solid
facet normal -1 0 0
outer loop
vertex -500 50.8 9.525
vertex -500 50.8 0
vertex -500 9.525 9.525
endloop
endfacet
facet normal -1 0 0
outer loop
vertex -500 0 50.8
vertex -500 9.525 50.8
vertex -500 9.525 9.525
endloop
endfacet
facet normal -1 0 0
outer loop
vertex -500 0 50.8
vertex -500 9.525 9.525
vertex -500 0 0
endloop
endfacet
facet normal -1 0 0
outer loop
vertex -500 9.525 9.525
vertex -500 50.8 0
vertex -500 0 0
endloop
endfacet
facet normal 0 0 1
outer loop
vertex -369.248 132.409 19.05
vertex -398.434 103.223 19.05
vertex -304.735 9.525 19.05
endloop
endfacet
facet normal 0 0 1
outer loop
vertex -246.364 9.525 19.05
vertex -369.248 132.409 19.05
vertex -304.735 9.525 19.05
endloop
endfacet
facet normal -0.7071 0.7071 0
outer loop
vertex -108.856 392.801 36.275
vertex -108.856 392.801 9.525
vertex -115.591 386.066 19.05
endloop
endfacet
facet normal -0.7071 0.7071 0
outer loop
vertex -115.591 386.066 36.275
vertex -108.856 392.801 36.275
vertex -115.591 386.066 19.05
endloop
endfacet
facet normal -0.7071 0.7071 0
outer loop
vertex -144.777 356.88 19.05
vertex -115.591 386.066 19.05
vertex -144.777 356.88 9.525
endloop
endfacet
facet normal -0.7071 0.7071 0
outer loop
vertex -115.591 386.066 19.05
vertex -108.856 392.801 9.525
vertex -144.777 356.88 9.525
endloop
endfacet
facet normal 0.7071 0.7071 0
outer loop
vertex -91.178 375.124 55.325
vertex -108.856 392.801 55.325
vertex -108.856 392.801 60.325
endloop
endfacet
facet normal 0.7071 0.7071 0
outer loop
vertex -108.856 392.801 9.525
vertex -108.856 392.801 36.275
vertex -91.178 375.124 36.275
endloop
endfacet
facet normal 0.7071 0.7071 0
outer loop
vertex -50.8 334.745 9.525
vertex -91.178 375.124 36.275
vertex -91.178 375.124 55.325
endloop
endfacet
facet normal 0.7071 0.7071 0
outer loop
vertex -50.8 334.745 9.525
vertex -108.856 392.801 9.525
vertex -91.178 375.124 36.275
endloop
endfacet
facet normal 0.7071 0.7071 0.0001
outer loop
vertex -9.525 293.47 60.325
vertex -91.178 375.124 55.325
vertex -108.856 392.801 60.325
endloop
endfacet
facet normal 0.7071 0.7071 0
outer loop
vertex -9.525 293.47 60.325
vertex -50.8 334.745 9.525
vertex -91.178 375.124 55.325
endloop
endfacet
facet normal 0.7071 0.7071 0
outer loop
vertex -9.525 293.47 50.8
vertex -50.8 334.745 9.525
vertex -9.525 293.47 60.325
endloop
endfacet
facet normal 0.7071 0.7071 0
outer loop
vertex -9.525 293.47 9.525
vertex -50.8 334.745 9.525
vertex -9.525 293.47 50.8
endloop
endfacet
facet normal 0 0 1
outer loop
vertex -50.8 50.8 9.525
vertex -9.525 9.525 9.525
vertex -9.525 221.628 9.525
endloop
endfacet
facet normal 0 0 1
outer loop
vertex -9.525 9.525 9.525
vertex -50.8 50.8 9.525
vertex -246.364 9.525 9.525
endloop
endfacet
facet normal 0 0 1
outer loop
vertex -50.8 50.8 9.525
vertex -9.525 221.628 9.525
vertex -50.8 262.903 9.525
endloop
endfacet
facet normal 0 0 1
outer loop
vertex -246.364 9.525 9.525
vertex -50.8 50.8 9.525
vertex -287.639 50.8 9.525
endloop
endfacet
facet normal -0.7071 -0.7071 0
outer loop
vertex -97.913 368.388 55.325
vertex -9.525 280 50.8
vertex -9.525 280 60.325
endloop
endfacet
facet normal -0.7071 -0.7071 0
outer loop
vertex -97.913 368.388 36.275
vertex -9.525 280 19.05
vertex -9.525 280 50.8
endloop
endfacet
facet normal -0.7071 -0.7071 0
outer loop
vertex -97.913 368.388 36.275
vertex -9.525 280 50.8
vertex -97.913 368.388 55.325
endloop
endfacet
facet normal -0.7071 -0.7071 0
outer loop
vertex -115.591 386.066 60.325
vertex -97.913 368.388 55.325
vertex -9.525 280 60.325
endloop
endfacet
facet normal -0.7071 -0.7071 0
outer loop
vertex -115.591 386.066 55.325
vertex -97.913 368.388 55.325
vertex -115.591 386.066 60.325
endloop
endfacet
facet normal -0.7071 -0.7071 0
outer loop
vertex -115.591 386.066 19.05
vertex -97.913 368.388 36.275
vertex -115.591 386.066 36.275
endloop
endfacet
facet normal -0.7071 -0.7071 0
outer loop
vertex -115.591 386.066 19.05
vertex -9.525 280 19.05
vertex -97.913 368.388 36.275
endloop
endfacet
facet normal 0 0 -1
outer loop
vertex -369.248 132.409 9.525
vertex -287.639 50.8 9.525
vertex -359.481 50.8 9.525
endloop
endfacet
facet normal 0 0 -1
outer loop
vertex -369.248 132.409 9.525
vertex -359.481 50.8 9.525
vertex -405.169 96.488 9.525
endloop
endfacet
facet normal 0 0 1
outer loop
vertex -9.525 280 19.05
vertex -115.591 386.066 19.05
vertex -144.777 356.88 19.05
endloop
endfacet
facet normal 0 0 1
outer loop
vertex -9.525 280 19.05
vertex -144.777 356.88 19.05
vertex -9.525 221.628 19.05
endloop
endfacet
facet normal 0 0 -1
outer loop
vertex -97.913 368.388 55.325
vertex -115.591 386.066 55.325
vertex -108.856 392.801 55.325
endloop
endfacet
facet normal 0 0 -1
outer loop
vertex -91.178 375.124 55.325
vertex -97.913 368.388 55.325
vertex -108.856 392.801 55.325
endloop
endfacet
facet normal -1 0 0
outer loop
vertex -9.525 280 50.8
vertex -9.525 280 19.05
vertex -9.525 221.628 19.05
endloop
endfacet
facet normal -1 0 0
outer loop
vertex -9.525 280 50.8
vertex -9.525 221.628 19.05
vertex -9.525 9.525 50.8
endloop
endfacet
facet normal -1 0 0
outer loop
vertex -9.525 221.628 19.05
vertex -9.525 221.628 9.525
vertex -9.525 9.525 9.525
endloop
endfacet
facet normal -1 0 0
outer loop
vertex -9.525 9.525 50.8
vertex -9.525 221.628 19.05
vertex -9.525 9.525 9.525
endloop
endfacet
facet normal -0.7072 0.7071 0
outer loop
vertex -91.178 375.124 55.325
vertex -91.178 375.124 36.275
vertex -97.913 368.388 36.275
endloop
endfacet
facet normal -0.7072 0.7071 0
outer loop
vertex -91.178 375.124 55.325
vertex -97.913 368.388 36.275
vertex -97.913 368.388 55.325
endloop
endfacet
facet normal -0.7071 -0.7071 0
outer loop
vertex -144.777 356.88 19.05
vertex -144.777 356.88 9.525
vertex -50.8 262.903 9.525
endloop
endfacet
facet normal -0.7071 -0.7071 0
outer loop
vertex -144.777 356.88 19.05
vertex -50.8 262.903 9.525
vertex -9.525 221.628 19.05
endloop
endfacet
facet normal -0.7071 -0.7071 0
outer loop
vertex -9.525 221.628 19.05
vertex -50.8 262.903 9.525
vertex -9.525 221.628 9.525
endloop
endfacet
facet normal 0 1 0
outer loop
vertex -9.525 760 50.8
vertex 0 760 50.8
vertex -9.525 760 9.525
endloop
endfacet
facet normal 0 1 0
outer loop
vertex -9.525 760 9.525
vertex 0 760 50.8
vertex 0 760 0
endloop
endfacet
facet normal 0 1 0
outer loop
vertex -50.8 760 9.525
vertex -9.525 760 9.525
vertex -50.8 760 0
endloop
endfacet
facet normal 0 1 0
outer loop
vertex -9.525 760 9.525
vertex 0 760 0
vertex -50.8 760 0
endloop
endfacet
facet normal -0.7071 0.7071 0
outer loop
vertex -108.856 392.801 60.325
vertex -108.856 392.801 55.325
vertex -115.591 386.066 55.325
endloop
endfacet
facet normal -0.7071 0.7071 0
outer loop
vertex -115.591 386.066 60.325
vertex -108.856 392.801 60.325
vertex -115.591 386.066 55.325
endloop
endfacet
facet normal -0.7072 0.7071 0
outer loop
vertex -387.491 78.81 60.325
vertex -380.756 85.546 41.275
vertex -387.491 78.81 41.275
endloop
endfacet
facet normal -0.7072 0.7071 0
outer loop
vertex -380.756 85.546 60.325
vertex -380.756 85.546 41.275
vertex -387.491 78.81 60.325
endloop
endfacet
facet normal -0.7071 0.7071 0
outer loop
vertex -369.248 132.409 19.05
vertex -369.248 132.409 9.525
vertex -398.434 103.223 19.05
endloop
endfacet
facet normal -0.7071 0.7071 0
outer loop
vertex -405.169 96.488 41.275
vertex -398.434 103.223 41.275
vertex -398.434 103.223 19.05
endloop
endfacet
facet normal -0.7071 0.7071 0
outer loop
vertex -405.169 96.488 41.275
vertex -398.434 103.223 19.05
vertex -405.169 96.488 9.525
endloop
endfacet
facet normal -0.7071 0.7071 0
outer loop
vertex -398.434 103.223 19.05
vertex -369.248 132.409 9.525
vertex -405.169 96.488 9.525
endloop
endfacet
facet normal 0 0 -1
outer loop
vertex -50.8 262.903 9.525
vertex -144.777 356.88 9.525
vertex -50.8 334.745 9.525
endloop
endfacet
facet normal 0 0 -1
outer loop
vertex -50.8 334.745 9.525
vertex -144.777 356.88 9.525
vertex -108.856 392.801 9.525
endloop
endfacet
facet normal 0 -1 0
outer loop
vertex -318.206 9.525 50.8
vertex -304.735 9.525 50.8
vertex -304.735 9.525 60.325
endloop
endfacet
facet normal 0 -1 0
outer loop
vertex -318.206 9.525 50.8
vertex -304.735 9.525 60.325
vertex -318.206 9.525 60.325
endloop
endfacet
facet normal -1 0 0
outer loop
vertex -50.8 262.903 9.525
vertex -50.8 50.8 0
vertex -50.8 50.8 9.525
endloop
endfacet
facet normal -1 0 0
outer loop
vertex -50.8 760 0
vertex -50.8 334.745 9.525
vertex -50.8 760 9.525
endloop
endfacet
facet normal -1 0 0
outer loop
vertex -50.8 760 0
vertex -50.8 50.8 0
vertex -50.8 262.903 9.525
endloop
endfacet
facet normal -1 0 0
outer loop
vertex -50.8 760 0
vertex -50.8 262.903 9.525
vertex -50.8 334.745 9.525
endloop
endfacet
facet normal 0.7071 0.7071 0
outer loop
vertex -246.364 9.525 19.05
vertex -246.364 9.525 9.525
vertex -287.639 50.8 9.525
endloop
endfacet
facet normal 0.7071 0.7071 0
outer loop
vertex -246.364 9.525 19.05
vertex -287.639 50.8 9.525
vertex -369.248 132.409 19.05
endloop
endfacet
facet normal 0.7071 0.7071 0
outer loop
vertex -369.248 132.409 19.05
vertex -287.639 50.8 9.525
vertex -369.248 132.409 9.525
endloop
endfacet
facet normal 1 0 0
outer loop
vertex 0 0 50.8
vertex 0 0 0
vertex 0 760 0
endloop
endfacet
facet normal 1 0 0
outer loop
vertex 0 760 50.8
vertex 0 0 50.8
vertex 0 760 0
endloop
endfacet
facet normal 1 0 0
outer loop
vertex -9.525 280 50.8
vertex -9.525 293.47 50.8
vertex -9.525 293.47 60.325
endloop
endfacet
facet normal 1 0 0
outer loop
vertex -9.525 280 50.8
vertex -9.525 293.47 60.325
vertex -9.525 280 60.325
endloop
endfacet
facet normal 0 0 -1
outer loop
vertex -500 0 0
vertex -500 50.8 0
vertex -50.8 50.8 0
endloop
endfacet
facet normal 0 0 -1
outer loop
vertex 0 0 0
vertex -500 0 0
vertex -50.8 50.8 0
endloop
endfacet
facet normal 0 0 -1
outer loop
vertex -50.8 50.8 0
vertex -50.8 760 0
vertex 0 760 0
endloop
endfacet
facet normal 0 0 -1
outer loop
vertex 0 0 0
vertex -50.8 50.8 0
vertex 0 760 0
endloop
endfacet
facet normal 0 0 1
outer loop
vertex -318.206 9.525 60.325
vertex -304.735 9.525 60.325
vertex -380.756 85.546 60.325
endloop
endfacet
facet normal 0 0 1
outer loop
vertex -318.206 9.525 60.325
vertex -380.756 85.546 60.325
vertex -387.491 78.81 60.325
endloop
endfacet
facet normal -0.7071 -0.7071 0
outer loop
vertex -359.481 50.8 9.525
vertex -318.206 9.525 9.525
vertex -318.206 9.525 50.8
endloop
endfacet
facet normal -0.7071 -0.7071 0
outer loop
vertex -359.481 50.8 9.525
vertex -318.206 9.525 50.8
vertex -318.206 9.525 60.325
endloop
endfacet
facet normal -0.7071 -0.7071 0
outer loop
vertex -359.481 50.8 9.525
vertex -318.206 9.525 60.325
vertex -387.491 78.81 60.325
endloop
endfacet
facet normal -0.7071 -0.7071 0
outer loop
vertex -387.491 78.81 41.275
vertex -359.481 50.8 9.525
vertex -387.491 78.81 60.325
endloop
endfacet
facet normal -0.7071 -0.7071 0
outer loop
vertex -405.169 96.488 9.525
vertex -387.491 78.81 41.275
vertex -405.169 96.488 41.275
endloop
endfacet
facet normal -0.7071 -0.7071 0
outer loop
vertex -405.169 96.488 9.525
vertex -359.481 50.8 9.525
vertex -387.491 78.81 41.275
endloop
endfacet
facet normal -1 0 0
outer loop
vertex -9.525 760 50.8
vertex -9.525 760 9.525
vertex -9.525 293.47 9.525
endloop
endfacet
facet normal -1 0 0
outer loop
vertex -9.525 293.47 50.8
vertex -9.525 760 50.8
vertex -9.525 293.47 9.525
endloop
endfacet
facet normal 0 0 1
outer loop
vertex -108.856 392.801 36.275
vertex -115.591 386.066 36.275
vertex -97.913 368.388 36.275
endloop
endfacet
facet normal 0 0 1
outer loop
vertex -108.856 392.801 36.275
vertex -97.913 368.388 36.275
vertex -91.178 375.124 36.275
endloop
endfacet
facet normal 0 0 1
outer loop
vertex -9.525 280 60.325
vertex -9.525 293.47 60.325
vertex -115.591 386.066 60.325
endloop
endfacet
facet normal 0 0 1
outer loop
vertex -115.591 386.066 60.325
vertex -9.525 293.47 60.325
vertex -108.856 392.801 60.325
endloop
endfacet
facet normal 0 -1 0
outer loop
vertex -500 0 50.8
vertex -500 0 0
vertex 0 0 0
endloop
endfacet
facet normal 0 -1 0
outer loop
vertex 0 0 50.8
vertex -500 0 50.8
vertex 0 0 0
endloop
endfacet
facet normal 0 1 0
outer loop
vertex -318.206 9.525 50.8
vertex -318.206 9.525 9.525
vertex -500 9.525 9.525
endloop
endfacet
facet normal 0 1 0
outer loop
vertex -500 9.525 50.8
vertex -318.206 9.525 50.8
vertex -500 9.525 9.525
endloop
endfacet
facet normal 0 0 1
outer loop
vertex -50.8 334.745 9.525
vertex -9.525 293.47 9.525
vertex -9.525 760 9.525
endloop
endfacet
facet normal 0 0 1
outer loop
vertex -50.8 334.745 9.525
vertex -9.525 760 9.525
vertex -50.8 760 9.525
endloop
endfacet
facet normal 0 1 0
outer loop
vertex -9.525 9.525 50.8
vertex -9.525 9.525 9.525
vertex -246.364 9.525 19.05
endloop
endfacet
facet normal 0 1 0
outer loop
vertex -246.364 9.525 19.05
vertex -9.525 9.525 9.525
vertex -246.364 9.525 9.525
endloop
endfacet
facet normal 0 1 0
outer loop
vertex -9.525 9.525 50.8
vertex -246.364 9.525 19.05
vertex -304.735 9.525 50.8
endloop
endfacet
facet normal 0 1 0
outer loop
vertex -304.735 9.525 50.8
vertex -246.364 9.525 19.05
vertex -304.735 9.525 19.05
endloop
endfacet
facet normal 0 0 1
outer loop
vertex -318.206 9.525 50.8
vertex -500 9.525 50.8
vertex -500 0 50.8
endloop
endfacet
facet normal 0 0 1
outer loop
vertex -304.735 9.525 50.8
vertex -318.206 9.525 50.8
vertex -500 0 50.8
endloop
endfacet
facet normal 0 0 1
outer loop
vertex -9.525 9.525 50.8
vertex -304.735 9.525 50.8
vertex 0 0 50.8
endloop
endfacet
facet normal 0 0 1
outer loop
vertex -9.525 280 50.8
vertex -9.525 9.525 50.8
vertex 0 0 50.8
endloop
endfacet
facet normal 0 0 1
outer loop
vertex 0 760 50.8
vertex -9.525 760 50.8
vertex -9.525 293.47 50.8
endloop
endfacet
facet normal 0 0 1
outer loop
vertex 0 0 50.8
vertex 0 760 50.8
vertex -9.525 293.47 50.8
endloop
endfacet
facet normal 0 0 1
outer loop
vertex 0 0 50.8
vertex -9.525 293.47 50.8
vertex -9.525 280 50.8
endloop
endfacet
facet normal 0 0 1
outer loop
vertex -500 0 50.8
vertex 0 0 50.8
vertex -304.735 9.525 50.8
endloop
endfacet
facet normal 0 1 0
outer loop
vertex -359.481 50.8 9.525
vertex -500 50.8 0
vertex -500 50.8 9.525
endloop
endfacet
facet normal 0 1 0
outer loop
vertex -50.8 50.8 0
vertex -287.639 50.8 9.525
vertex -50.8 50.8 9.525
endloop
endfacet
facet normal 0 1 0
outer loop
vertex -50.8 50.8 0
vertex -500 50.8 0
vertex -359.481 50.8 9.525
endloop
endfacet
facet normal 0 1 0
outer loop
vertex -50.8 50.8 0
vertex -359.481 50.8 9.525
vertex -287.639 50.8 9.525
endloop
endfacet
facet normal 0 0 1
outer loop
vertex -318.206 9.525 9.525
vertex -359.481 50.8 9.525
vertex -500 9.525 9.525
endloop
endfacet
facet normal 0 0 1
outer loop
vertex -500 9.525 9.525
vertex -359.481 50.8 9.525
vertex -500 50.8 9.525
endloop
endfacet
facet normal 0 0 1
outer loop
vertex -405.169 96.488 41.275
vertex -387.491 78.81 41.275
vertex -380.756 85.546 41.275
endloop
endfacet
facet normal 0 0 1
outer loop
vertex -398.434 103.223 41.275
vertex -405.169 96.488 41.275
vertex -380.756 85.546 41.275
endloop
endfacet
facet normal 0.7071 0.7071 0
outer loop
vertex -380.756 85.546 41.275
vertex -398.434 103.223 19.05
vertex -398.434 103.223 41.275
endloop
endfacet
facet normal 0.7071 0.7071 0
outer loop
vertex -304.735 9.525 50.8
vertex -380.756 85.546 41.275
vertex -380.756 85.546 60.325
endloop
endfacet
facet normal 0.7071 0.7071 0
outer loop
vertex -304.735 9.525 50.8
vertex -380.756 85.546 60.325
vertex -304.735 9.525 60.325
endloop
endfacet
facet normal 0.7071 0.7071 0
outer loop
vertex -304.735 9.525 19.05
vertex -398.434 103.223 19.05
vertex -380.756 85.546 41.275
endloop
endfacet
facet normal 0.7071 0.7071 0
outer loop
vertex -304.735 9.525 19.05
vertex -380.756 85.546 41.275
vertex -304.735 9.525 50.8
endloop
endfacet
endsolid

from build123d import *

# Parameters (mm, degrees)
SALIENTE_EXTRUIR1_DEPTH = 50.8
SALIENTE_EXTRUIR2_DEPTH = 9.525
SALIENTE_EXTRUIR3_DEPTH = 50.8
SALIENTE_EXTRUIR4_DEPTH = 9.525
CROQUIS5_W              = 19.05
CROQUIS5_H              = 9.525
CORTAR_EXTRUIR1_DEPTH   = 25


with BuildPart() as part:
    # Croquis1 → Saliente-Extruir1 (new body)
    with BuildSketch(Plane.XY):
        Polygon((0, 0), (0, 760), (-9.525, 760), (-9.525, 9.525), (-500, 9.525), (-500, 0), align=None)
    extrude(amount=SALIENTE_EXTRUIR1_DEPTH)

    # Croquis2 → Saliente-Extruir2 (add)
    with BuildSketch(Plane(origin=(0, 0, 0), x_dir=(-1, 0, 0), z_dir=(0, 0, -1))):
        Polygon((0, 760), (0, 0), (500, 0), (500, 50.8), (50.8, 50.8), (50.8, 760), align=None)
    extrude(amount=-SALIENTE_EXTRUIR2_DEPTH)

    # Croquis3 → Saliente-Extruir3 (add)
    with BuildSketch(Plane.XY.offset(9.525)):
        Polygon((-9.525, 280), (-115.591017178, 386.066017178), (-108.855825087, 392.801209269), (-9.525, 293.470384182), align=None)
        Polygon((-304.735424949, 9.525), (-318.205809131, 9.525), (-405.168921743, 96.488112613), (-398.433729653, 103.223304703), align=None)
    extrude(amount=SALIENTE_EXTRUIR3_DEPTH)

    # Croquis4 → Saliente-Extruir4 (add)
    with BuildSketch(Plane.XY.offset(9.525)):
        Polygon((-9.525, 280), (-115.591017178, 386.066017178), (-144.776849571, 356.880184785), (-9.525, 221.628335213), align=None)
        Polygon((-398.433729653, 103.223304703), (-304.735424949, 9.525), (-246.363760162, 9.525), (-369.247897259, 132.409137097), align=None)
    extrude(amount=SALIENTE_EXTRUIR4_DEPTH)

    # Croquis5 → Cortar-Extruir1 (cut)
    with BuildSketch(Plane(origin=(-250.828517178, 250.828517178, 0), x_dir=(0, 0, 1), z_dir=(-0.7071067811865419, 0.7071067811865532, 0))):
        with Locations((45.8, 196.017206641)):
            Rectangle(CROQUIS5_W, CROQUIS5_H)
        with Locations((50.8, -213.507793359)):
            Rectangle(CROQUIS5_W, CROQUIS5_H)
    extrude(amount=-CORTAR_EXTRUIR1_DEPTH, mode=Mode.SUBTRACT)


solid = part.part
